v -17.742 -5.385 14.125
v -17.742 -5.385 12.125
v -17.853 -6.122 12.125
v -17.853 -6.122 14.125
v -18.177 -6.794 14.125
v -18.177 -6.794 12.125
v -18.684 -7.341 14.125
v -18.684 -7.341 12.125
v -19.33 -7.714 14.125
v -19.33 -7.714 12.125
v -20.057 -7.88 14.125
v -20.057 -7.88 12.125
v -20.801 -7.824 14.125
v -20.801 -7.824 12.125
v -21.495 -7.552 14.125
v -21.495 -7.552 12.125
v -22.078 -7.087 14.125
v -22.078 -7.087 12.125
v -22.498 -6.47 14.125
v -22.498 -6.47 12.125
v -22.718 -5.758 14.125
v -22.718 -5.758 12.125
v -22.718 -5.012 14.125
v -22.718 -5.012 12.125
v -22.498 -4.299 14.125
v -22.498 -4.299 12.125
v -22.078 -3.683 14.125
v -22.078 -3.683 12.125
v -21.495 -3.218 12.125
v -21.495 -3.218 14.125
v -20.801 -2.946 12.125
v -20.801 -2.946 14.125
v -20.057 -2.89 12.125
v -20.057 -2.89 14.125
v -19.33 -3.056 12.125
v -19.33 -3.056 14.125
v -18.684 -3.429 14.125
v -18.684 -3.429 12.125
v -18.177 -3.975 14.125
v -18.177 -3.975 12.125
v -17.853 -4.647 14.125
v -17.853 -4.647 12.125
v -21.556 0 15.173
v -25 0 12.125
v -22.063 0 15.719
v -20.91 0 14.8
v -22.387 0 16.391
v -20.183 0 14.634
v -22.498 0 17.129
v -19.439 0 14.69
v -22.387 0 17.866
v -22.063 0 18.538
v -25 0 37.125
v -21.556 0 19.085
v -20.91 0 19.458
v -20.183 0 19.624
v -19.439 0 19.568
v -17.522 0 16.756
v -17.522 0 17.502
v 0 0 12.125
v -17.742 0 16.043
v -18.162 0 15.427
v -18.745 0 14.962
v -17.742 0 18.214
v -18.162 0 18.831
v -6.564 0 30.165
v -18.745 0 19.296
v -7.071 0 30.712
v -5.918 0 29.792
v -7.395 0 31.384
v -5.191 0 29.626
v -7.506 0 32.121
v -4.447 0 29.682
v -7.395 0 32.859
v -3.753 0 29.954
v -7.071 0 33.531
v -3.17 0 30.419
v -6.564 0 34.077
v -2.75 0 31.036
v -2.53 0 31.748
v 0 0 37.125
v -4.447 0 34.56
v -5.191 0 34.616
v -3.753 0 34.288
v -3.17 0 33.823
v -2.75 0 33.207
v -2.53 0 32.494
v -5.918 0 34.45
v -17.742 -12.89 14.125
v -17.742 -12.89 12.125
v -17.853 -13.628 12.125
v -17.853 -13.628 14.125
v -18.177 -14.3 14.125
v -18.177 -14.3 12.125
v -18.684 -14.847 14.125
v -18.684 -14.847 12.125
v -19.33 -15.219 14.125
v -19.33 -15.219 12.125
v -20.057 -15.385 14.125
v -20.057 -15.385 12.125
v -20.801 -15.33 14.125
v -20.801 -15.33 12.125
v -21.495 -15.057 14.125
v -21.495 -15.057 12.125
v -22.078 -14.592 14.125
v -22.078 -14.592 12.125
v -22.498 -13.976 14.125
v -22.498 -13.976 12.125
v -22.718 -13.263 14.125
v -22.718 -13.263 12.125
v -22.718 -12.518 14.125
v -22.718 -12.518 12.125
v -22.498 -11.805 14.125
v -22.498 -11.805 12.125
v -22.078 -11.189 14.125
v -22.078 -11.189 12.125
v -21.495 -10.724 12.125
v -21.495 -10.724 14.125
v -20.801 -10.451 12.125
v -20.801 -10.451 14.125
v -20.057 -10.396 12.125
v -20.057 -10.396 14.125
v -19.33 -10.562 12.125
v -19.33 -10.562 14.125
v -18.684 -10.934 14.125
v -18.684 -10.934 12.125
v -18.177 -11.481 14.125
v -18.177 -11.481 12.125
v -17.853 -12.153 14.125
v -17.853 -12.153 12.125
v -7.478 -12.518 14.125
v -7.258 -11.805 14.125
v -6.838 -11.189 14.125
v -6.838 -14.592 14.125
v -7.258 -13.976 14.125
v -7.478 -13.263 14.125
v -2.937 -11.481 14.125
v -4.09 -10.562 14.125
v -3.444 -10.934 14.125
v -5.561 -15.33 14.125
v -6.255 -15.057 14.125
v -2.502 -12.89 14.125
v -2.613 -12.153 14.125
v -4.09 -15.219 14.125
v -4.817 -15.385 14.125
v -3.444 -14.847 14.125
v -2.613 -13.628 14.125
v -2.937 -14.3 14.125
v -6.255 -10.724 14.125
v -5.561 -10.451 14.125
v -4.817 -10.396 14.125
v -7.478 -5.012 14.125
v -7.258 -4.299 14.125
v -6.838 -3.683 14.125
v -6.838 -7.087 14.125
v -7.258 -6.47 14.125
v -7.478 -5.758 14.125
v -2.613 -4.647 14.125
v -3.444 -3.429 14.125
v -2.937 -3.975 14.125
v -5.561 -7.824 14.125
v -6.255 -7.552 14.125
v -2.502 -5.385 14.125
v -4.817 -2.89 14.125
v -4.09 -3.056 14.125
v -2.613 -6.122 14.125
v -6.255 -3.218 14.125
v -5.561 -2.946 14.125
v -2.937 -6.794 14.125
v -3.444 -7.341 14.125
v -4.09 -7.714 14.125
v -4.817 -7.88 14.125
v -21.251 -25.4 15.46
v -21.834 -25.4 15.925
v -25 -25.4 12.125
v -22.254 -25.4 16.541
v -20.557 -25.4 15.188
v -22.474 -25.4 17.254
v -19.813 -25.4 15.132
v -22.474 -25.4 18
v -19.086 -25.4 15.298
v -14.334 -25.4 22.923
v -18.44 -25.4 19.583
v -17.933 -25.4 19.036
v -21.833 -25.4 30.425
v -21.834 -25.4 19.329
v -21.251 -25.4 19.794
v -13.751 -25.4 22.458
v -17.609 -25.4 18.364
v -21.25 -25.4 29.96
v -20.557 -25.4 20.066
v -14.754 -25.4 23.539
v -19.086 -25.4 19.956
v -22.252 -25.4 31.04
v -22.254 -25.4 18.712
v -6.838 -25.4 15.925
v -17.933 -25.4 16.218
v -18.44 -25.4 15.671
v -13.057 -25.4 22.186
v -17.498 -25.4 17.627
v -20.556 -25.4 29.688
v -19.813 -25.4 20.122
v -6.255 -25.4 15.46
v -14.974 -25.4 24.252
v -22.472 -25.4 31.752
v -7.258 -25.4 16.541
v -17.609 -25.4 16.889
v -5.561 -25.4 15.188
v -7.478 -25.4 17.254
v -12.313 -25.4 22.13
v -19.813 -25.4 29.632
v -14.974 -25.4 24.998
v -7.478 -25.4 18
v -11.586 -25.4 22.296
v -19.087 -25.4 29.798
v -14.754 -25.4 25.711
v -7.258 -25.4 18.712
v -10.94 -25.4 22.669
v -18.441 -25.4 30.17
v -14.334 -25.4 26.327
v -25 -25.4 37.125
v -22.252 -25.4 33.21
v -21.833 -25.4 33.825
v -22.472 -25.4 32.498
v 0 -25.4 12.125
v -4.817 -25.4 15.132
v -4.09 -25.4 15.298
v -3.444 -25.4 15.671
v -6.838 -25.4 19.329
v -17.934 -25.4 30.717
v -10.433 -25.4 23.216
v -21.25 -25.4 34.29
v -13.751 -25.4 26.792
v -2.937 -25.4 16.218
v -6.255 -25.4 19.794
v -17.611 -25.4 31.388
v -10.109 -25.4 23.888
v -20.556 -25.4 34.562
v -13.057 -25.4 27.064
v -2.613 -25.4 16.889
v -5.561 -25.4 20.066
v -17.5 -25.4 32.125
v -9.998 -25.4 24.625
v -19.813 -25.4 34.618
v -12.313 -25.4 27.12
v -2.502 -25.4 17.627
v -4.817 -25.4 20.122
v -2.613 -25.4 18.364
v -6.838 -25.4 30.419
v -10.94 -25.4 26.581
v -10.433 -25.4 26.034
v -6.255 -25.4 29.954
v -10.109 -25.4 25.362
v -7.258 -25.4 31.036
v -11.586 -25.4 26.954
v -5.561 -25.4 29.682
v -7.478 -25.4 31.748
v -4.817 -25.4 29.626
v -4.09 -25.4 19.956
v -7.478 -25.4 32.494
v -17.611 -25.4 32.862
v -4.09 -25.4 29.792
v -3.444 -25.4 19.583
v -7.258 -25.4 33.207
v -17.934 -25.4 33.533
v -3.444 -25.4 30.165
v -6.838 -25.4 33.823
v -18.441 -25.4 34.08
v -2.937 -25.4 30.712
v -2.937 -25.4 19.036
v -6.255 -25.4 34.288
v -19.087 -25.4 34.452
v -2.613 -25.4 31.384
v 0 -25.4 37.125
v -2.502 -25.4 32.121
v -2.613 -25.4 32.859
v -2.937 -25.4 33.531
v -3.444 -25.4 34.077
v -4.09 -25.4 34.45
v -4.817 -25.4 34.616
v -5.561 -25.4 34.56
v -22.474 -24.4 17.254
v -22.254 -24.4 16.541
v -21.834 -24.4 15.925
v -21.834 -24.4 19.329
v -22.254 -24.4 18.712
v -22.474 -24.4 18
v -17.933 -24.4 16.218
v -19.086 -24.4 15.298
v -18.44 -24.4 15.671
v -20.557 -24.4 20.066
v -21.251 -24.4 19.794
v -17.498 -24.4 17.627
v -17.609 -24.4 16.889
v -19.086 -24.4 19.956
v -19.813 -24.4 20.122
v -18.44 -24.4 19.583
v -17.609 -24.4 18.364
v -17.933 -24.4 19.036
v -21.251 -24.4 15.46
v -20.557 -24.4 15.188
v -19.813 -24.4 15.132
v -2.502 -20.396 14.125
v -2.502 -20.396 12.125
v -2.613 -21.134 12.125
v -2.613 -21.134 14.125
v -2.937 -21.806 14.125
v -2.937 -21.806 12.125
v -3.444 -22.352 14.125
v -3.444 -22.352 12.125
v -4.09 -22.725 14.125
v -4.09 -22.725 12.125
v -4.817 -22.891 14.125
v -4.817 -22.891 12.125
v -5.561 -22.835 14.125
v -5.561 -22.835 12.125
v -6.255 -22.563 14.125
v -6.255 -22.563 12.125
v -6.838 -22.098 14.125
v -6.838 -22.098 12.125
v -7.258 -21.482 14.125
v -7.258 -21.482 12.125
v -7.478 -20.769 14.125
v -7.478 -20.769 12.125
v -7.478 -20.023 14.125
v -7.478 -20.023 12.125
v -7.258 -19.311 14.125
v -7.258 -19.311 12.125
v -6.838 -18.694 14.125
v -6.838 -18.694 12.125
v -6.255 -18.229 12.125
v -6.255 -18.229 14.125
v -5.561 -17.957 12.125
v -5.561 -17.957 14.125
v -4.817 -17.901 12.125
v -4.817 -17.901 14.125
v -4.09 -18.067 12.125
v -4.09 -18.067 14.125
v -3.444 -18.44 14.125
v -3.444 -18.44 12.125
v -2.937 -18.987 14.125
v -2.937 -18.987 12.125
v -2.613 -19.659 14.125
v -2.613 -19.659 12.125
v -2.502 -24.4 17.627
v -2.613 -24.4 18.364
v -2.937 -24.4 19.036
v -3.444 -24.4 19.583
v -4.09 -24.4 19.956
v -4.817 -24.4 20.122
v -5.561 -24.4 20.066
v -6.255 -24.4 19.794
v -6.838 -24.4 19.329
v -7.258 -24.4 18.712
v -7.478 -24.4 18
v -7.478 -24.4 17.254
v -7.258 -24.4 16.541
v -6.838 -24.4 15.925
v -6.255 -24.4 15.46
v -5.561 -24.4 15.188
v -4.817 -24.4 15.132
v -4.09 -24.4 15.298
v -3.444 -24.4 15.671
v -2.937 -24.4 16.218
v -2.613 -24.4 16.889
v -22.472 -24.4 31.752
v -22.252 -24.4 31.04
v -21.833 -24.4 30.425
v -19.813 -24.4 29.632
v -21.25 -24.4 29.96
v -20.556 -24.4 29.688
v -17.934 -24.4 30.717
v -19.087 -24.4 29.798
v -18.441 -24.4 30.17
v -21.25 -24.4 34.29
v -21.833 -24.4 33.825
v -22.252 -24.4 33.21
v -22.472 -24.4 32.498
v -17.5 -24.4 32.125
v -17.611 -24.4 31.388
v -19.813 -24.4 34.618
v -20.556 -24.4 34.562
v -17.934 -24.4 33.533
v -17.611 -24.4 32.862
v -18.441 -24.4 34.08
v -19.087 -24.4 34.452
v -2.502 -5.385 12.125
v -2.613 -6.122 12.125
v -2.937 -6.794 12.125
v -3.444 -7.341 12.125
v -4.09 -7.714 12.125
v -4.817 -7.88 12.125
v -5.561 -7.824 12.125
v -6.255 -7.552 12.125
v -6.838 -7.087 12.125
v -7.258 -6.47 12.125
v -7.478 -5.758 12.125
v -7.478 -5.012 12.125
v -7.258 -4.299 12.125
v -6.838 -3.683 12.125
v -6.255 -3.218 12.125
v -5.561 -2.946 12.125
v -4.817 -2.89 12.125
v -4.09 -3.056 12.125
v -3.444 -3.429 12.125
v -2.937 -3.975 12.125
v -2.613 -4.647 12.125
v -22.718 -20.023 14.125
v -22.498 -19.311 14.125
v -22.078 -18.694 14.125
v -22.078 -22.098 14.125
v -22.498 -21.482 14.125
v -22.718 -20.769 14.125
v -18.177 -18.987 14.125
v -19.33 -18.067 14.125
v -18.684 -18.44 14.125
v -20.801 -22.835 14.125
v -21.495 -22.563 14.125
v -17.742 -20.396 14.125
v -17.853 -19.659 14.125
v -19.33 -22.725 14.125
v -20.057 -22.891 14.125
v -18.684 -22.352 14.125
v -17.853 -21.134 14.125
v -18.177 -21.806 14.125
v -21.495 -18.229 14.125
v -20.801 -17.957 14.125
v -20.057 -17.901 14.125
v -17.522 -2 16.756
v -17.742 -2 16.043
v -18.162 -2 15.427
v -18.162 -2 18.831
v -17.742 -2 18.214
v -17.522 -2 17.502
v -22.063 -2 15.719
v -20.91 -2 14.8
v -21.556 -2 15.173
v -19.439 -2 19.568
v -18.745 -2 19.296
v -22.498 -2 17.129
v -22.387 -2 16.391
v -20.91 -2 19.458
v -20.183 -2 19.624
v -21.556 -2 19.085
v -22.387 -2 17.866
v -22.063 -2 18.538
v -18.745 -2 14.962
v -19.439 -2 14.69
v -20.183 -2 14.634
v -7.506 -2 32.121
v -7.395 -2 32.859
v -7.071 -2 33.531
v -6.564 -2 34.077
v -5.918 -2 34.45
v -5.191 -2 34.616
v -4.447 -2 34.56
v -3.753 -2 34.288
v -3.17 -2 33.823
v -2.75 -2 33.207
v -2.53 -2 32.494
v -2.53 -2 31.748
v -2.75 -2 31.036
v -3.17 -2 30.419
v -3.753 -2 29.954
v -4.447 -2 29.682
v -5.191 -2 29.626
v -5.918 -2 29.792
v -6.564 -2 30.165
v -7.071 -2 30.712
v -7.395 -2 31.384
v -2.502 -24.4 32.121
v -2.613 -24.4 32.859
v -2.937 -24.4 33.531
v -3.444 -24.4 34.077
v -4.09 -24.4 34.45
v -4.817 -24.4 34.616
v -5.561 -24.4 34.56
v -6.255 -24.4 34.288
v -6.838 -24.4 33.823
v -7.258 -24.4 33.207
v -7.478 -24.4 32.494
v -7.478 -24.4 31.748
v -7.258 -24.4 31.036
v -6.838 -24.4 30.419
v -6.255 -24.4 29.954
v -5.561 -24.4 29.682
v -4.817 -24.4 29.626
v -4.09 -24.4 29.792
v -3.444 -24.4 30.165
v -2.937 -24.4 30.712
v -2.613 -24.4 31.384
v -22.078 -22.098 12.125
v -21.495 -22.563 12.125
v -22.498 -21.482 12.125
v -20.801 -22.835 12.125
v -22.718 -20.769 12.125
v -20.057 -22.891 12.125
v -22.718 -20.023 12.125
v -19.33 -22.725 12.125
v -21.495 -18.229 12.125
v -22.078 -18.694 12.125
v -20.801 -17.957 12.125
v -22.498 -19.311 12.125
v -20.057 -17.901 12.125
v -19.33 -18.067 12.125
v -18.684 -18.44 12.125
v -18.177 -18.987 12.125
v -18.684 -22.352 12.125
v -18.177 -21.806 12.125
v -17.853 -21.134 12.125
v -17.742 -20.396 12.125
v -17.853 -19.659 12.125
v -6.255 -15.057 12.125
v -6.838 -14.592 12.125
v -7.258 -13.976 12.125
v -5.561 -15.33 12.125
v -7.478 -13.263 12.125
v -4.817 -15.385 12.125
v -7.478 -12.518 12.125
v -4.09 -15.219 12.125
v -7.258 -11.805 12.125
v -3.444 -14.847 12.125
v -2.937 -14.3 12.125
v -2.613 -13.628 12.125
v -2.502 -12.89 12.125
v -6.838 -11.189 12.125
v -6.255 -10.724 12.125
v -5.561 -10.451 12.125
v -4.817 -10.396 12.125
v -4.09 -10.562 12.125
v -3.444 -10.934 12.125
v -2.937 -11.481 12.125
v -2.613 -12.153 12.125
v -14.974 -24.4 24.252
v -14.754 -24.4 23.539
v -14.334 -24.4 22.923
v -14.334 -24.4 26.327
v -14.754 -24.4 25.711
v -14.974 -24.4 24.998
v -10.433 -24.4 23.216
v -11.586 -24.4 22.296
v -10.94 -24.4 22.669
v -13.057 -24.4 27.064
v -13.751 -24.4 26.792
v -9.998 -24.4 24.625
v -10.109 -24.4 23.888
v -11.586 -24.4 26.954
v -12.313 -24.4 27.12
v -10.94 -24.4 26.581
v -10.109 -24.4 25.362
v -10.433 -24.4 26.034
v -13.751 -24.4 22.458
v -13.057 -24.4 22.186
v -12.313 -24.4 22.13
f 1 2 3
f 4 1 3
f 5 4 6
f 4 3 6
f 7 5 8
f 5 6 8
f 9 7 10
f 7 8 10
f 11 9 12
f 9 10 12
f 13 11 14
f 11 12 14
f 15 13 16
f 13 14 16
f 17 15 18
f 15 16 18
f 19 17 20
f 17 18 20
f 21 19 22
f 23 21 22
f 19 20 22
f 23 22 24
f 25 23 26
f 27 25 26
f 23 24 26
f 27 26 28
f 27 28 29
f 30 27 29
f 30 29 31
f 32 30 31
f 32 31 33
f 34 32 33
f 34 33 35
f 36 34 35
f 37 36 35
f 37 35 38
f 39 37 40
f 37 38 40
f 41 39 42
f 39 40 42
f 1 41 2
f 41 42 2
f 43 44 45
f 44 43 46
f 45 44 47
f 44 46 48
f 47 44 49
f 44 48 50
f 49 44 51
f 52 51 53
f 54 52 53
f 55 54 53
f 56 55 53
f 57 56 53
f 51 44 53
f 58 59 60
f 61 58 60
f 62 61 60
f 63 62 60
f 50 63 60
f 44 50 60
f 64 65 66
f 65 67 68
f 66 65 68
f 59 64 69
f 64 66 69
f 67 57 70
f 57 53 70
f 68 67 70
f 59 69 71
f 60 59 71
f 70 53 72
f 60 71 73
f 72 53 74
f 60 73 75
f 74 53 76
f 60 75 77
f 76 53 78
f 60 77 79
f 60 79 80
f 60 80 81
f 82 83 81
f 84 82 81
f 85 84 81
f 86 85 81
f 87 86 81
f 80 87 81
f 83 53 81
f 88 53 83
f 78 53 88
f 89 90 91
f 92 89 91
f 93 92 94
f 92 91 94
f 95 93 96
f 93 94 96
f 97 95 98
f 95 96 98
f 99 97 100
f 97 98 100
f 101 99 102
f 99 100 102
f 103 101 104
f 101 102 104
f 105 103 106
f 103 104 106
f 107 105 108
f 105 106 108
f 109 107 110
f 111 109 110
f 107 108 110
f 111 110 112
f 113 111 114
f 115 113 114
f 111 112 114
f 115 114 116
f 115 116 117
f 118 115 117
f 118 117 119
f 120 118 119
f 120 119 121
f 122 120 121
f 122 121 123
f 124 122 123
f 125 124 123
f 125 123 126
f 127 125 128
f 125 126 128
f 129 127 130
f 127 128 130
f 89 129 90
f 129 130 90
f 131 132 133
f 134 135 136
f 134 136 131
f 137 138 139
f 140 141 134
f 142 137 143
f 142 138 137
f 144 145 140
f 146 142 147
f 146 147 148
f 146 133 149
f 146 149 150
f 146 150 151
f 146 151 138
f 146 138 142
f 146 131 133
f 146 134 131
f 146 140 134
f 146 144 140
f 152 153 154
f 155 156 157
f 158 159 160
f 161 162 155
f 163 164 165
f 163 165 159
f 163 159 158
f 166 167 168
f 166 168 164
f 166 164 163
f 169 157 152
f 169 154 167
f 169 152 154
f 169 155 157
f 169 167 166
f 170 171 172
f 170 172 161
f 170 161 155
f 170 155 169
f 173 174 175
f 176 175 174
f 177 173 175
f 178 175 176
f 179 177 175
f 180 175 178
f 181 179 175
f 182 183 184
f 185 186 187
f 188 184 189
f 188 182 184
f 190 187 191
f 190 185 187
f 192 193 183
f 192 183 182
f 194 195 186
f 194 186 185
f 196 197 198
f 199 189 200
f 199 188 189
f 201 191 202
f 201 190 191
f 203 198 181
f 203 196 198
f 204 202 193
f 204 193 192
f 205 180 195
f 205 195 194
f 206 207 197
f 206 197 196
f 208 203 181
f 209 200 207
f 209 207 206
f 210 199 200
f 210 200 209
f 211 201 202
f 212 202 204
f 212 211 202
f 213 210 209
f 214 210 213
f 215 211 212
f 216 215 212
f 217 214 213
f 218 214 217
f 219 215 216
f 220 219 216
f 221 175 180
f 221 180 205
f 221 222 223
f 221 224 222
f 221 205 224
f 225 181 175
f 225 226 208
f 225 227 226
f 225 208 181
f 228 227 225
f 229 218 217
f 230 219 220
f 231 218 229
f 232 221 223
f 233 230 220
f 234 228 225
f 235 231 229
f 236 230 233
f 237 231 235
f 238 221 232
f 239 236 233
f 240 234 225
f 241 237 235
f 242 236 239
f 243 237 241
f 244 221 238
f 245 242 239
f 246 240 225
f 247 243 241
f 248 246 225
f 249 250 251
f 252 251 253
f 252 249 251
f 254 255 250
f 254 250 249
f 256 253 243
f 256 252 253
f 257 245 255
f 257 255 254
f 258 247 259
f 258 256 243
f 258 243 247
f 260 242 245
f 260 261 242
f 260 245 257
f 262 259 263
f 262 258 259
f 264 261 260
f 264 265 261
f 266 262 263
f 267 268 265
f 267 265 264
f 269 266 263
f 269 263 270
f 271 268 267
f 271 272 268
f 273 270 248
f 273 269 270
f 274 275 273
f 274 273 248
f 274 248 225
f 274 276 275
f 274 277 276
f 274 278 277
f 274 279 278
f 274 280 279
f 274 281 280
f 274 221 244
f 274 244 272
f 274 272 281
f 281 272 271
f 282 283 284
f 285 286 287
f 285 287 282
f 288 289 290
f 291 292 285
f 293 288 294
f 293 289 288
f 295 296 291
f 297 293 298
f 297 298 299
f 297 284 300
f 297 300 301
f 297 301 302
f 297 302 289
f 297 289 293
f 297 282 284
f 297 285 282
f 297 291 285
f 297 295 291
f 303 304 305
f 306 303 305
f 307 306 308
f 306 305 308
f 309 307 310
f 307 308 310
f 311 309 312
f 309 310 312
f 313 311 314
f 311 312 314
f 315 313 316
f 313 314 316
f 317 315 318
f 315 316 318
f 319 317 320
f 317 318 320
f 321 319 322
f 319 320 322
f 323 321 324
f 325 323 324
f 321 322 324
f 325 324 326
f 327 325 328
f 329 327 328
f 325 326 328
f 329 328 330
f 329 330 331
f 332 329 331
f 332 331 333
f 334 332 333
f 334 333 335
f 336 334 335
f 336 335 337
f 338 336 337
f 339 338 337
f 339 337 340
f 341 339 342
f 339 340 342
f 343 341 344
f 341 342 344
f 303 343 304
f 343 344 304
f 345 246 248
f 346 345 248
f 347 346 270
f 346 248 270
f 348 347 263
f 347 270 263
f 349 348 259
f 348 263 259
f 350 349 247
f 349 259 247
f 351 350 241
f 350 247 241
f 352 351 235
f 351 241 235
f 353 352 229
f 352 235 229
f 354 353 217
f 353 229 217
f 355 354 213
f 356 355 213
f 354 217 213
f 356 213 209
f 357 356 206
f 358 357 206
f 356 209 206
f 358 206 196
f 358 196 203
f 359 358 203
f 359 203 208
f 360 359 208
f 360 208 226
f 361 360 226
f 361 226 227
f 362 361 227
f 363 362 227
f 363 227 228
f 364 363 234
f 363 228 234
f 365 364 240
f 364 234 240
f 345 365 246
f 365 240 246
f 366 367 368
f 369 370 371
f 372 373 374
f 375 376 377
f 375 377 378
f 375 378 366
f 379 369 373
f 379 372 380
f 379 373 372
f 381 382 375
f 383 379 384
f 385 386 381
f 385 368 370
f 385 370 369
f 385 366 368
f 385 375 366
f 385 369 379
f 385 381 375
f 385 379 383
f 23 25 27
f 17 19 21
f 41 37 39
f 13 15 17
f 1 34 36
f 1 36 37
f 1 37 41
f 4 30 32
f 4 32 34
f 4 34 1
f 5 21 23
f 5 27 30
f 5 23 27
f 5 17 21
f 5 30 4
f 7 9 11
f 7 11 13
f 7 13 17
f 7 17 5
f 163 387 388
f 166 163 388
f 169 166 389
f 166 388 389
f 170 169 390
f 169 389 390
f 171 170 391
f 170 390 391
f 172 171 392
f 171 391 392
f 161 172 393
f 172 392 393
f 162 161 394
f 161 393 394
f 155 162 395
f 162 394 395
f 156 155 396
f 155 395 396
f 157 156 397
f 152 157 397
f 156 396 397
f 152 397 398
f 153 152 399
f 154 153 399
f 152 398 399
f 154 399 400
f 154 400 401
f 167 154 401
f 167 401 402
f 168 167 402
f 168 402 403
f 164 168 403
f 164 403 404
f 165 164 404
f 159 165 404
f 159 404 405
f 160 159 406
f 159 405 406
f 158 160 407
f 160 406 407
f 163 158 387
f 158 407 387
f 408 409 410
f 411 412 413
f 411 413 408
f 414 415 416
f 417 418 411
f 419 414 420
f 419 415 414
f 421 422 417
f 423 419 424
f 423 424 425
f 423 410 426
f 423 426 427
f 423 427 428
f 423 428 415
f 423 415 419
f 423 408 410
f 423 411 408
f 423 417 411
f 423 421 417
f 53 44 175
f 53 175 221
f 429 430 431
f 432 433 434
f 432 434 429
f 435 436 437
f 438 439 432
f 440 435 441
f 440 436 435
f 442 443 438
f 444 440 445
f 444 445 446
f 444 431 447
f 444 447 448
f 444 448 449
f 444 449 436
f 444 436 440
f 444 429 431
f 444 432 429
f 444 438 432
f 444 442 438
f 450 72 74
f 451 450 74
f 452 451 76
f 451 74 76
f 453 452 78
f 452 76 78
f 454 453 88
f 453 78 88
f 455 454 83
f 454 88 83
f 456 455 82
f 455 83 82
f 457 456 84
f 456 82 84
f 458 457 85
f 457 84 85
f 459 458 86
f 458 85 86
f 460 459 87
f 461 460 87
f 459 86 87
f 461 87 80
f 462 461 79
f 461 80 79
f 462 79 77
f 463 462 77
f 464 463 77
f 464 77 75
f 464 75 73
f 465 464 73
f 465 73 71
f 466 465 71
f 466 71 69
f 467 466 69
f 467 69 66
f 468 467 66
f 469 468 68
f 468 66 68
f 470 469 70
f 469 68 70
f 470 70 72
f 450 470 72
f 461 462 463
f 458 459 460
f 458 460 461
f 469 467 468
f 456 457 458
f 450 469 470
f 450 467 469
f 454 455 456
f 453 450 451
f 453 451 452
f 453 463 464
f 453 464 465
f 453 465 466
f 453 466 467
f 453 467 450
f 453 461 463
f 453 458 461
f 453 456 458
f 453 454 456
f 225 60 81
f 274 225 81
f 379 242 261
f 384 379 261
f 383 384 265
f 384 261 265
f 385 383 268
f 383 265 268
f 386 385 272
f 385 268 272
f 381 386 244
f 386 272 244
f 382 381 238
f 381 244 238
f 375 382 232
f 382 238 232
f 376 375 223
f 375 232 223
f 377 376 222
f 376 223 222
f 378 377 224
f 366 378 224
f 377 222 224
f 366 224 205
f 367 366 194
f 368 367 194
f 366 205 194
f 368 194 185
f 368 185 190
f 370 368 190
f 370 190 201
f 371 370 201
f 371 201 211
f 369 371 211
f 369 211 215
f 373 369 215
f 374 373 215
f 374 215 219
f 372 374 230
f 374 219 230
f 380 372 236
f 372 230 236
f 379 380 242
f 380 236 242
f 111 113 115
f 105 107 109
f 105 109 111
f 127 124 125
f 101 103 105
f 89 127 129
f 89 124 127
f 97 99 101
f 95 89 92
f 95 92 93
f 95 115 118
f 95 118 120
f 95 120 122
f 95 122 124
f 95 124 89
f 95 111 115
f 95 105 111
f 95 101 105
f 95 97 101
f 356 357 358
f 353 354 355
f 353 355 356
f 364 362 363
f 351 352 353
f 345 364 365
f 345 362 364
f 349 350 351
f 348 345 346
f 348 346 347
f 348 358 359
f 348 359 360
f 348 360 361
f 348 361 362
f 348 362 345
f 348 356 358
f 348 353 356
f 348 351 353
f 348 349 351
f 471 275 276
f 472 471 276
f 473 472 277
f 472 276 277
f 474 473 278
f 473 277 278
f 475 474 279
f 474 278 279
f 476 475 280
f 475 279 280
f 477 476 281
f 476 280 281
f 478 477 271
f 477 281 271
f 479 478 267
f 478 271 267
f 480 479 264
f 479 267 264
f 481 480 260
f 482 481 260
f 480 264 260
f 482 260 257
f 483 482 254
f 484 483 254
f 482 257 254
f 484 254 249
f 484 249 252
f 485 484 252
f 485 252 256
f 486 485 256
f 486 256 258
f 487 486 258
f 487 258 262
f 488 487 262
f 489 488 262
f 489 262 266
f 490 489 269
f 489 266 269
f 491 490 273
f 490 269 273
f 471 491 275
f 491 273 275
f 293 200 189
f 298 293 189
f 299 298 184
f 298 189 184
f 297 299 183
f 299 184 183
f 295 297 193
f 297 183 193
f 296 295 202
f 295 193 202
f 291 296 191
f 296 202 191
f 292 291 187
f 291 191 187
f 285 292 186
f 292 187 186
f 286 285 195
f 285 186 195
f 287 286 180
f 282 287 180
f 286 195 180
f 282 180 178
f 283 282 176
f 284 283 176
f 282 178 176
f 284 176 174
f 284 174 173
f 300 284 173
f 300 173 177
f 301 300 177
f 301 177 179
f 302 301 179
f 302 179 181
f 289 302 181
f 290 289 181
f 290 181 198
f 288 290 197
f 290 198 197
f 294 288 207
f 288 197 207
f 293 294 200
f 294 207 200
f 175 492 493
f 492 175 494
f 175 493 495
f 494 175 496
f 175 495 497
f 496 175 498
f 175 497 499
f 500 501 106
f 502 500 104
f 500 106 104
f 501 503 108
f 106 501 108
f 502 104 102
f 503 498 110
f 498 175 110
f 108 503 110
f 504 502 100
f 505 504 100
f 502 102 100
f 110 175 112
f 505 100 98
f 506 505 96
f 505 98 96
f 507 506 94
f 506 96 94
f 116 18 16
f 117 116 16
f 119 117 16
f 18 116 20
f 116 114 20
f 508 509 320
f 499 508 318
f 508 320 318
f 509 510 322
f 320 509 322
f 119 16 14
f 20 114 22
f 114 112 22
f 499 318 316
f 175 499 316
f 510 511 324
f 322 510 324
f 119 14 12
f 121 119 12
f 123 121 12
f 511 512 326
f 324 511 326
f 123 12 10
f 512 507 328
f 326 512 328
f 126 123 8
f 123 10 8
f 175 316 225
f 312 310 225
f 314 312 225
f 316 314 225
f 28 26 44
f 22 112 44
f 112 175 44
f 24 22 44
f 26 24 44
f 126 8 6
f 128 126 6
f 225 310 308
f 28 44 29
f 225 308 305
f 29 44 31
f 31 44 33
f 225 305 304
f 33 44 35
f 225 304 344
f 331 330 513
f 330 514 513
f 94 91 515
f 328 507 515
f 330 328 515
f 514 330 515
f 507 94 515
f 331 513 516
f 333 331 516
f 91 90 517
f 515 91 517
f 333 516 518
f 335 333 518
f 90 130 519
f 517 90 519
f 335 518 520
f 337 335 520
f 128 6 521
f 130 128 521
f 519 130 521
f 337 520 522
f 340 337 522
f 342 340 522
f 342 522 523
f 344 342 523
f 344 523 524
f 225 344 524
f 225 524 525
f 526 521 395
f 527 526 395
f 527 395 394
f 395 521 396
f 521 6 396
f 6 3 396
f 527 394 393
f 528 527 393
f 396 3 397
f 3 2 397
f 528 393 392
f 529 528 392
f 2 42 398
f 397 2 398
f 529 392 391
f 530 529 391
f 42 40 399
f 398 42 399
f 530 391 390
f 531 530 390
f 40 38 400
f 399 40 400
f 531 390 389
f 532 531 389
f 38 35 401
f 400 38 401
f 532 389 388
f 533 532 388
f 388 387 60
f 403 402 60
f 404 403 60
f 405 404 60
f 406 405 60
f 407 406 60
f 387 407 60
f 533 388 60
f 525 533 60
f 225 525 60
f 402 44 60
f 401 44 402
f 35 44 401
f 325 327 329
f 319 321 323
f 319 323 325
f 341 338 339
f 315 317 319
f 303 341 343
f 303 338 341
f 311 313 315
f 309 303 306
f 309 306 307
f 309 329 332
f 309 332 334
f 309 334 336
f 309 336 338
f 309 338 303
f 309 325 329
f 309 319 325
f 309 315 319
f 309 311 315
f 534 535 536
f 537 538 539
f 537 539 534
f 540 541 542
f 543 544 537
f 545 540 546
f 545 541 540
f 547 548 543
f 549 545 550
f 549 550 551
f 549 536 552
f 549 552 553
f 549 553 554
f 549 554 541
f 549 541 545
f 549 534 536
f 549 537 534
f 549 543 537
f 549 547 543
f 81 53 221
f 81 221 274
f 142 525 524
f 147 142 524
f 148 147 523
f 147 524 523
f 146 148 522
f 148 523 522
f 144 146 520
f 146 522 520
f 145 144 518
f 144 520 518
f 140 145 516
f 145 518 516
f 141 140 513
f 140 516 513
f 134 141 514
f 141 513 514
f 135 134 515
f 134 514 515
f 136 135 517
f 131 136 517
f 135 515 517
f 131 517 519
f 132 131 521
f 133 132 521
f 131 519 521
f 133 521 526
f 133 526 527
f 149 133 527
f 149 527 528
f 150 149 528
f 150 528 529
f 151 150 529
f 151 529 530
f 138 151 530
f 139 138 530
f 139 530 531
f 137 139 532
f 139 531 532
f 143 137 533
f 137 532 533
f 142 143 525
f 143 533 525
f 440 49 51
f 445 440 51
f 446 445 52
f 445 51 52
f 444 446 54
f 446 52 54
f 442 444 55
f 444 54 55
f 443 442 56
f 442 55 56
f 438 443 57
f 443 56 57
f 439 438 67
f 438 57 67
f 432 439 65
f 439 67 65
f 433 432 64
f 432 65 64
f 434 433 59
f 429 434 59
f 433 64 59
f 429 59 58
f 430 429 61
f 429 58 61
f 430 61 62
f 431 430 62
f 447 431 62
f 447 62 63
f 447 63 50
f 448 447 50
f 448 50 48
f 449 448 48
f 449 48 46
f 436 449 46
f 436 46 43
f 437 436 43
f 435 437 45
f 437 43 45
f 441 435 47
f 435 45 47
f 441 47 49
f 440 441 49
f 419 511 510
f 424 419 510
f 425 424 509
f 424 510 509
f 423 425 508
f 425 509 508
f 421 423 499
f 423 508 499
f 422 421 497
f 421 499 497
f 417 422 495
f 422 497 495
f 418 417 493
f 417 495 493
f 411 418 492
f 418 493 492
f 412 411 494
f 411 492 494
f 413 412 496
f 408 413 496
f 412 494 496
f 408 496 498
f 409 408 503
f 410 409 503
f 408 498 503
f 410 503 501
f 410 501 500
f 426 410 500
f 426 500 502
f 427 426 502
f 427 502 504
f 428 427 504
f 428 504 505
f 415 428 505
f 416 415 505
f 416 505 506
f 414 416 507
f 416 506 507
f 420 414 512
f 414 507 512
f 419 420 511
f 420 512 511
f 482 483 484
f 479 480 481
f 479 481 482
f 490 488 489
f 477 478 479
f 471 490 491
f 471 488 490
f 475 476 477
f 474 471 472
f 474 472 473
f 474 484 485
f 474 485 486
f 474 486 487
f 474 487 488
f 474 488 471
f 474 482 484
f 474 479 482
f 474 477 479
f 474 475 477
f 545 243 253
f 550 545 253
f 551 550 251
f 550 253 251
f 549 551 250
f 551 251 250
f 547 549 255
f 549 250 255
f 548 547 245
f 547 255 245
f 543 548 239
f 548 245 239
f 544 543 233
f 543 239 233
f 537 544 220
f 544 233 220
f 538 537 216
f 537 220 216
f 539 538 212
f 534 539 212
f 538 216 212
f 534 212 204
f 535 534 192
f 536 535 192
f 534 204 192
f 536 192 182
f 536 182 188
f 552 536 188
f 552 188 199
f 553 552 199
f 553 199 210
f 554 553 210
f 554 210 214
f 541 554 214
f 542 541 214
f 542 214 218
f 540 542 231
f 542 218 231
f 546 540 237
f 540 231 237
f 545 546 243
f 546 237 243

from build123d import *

# Parameters (mm, degrees)
F0_W     = 25
F0_H     = 25
F1_DEPTH = 25.4
F2_R     = 2.5
F2_R_2   = 2.5019
F3_DEPTH = 1
F4_R     = 2.5019
F5_DEPTH = 2
F6_R     = 2.5019
F7_DEPTH = 2


with BuildPart() as f1:
    # F0 (on Front) → F1 (new body)
    with BuildSketch(Plane.XZ):
        with Locations((-12.5, 24.625)):
            Rectangle(F0_W, F0_H)
    extrude(amount=F1_DEPTH)

    # F2 (on face) → F3 (cut)
    with BuildSketch(Plane.XZ.offset(25.4)):
        with Locations((-20, 32.125)):
            Circle(F2_R)
        with Locations((-12.5, 24.625)):
            Circle(F2_R_2)
        with Locations((-5.0038, 32.1212)):
            Circle(F2_R_2)
        with Locations((-5.0038, 17.6269)):
            Circle(F2_R_2)
        with Locations((-20, 17.6269)):
            Circle(F2_R_2)
    extrude(amount=-F3_DEPTH, mode=Mode.SUBTRACT)

    # F4 (on face) → F5 (cut)
    with BuildSketch(Plane(origin=(0, 0, 0), x_dir=(-1, 0, 0), z_dir=(0, 1, 0))):
        with Locations((5.0038, 32.1212)):
            Circle(F4_R)
        with Locations((19.9962, 17.1288)):
            Circle(F4_R)
    extrude(amount=-F5_DEPTH, mode=Mode.SUBTRACT)

    # F6 (on face) → F7 (cut)
    with BuildSketch(Plane(origin=(0, 0, 12.125), x_dir=(1, 0, 0), z_dir=(0, 0, -1))):
        with Locations((-5.0038, 5.3848)):
            Circle(F6_R)
        with Locations((-20.2438, 12.8905)):
            Circle(F6_R)
        with Locations((-5.0038, 12.8905)):
            Circle(F6_R)
        with Locations((-5.0038, 20.3962)):
            Circle(F6_R)
        with Locations((-20.2438, 20.3962)):
            Circle(F6_R)
        with Locations((-20.2438, 5.3848)):
            Circle(F6_R)
    extrude(amount=-F7_DEPTH, mode=Mode.SUBTRACT)


solid = f1.part
